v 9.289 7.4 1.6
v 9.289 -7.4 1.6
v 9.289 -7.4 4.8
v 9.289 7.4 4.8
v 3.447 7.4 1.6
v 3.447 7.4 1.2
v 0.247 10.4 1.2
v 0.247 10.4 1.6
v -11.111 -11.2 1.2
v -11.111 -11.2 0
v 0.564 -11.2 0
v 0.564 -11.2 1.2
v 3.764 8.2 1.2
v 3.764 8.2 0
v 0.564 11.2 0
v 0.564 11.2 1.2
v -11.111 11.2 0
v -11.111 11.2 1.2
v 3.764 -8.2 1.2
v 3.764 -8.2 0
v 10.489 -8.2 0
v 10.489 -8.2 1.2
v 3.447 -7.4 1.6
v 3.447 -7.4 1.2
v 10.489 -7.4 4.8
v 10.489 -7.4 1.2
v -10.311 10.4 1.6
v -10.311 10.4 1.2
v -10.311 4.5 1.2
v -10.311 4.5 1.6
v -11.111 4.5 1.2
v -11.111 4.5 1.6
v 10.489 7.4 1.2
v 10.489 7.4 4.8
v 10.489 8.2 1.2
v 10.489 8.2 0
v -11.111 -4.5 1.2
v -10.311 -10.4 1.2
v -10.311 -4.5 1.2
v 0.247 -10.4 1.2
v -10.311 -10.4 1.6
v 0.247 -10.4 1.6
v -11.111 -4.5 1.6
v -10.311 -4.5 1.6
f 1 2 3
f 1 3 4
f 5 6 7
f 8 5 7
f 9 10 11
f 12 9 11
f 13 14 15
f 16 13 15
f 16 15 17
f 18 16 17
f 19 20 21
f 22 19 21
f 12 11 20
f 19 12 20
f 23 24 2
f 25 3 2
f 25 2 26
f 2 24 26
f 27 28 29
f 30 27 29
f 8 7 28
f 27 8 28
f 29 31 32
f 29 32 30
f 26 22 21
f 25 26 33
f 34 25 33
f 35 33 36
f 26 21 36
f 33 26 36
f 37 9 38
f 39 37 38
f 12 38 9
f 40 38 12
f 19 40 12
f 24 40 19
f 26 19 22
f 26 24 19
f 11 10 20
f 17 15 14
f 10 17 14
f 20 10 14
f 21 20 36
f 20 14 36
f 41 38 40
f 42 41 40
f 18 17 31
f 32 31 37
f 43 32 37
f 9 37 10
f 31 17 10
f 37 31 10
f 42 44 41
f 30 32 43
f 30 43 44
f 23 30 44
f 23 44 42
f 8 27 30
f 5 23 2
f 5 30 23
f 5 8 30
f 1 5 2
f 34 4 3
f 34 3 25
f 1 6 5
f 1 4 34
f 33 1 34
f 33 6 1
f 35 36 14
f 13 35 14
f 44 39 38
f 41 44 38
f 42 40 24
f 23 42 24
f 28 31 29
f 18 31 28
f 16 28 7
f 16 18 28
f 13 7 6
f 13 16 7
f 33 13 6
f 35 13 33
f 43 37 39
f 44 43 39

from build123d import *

# Parameters (mm, degrees)
F0_W     = 0.8
F0_H     = 9
F0_W_2   = 1.2
F0_H_2   = 14.8
F1_DEPTH = 1.2
F2_DEPTH = 1.6
F3_DEPTH = 4.8
F4_DEPTH = 1.6


with BuildPart() as f1:
    # F0 (on Top) → F1 (new body)
    with BuildSketch(Plane.XY):
        Polygon((9.289006, -7.4), (9.289006, 7.4), (3.447185, 7.4), (0.247185, 10.4), (-10.310994, 10.4), (-10.310994, 4.5), (-10.310994, -4.5), (-10.310994, -10.4), (0.247185, -10.4), (3.447185, -7.4), align=None)
        with Locations((-10.710994, 0)):
            Rectangle(F0_W, F0_H)
        Polygon((10.489006, -8.2), (10.489006, -7.4), (9.289006, -7.4), (3.447185, -7.4), (0.247185, -10.4), (-10.310994, -10.4), (-10.310994, -4.5), (-11.110994, -4.5), (-11.110994, -11.2), (0.563543, -11.2), (3.763543, -8.2), align=None)
        with Locations((9.889006, 0)):
            Rectangle(F0_W_2, F0_H_2)
        Polygon((10.489006, 8.2), (3.763543, 8.2), (0.563543, 11.2), (-11.110994, 11.2), (-11.110994, 4.5), (-10.310994, 4.5), (-10.310994, 10.4), (0.247185, 10.4), (3.447185, 7.4), (9.289006, 7.4), (10.489006, 7.4), align=None)
    extrude(amount=F1_DEPTH)

    # F0 (on Top) → F2 (join)
    with BuildSketch(Plane.XY):
        with Locations((-10.710994, 0)):
            Rectangle(F0_W, F0_H)
    extrude(amount=F2_DEPTH)

    # F0 (on Top) → F3 (join)
    with BuildSketch(Plane.XY):
        with Locations((9.889006, 0)):
            Rectangle(F0_W_2, F0_H_2)
    extrude(amount=F3_DEPTH)

    # F0 (on Top) → F4 (join)
    with BuildSketch(Plane.XY):
        Polygon((9.289006, -7.4), (9.289006, 7.4), (3.447185, 7.4), (0.247185, 10.4), (-10.310994, 10.4), (-10.310994, 4.5), (-10.310994, -4.5), (-10.310994, -10.4), (0.247185, -10.4), (3.447185, -7.4), align=None)
    extrude(amount=F4_DEPTH)


solid = f1.part
